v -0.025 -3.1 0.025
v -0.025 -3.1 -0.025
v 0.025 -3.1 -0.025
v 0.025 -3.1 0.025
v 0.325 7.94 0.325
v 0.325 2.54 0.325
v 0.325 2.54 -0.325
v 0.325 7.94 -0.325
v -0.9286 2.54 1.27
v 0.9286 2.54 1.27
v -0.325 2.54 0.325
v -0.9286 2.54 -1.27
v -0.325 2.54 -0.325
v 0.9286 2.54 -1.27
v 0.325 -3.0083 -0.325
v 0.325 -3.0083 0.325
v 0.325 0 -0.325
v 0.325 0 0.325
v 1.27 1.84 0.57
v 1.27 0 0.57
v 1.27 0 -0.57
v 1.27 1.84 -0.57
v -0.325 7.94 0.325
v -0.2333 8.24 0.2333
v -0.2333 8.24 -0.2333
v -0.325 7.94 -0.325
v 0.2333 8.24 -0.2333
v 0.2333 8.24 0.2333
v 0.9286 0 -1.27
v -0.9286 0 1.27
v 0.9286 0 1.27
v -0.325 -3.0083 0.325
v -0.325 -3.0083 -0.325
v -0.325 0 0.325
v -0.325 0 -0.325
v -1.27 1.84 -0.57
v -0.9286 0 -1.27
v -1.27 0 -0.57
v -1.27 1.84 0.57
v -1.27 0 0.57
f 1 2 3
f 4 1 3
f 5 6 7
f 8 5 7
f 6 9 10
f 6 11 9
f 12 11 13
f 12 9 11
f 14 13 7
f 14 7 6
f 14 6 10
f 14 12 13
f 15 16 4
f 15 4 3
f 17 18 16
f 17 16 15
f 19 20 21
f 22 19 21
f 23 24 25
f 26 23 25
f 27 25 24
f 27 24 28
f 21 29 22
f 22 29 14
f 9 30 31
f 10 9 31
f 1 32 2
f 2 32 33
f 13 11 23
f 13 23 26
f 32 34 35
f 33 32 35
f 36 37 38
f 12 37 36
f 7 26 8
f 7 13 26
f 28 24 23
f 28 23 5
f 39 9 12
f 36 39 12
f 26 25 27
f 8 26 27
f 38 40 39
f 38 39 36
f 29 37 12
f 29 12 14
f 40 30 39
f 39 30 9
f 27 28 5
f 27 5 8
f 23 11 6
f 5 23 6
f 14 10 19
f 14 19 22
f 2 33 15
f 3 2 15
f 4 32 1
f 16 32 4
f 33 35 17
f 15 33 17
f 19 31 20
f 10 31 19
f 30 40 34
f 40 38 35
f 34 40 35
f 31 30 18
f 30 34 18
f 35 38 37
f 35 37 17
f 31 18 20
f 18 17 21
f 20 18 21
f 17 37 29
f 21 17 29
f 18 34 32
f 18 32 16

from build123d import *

# Parameters (mm, degrees)
SKETCH1_W                = 2.54
SKETCH1_H                = 2.54
BOSS_EXTRUDE1_DEPTH      = 2.54
SKETCH2_W                = 0.65
SKETCH2_H                = 0.65
BOSS_EXTRUDE2_DEPTH      = 5.7
BOSS_EXTRUDE2_DEPTH_BACK = 5.64
CHAMFER1_SIZE            = 0.3
CHAMFER1_SIZE2           = 0.091719204
CHAMFER1_PART_2_SIZE     = 0.3
CHAMFER1_PART_2_SIZE2    = 0.091719204
CHAMFER1_PART_3_SIZE     = 0.3
CHAMFER1_PART_3_SIZE2    = 0.091719204
CHAMFER1_PART_4_SIZE     = 0.3
CHAMFER1_PART_4_SIZE2    = 0.091719204
CHAMFER1_PART_5_SIZE     = 0.3
CHAMFER1_PART_5_SIZE2    = 0.091719204
CHAMFER3_SIZE            = 0.7
CHAMFER3_SIZE2           = 0.341412812
CHAMFER4_SIZE            = 0.7
CHAMFER4_SIZE2           = 0.341412812


with BuildPart() as part:
    # Sketch1 → Boss-Extrude1 (new body)
    with BuildSketch(Plane(origin=(0, 0, 0), x_dir=(1, 0, 0), z_dir=(0, 1, 0))):
        Rectangle(SKETCH1_W, SKETCH1_H)
    extrude(amount=BOSS_EXTRUDE1_DEPTH)

    # Sketch2 → Boss-Extrude2 (add, two sides)
    with BuildSketch(Plane(origin=(0, 2.54, 0), x_dir=(1, 0, 0), z_dir=(0, 1, 0))) as boss_extrude2_sk:
        Rectangle(SKETCH2_W, SKETCH2_H)
    extrude(amount=BOSS_EXTRUDE2_DEPTH)
    extrude(boss_extrude2_sk.sketch, amount=-BOSS_EXTRUDE2_DEPTH_BACK)

    # Chamfer1
    chamfer1_edges = [part.edges().sort_by_distance(p)[0] for p in [
        (-0.325, -3.1, 0),
        (0, -3.1, -0.325),
        (0.325, -3.1, 0),
        (0, -3.1, 0.325),
    ]]
    chamfer1_side = [part.faces().sort_by_distance(p)[0] for p in [
        (0, -3.1, 0),
    ]]
    chamfer(chamfer1_edges, length=CHAMFER1_SIZE, length2=CHAMFER1_SIZE2, reference=chamfer1_side[0])

    # Chamfer1 part 2
    chamfer1_part_2_edges = [part.edges().sort_by_distance(p)[0] for p in [
        (-0.325, 8.24, 0),
    ]]
    chamfer1_part_2_side = [part.faces().sort_by_distance(p)[0] for p in [
        (-0.325, 5.39, 0),
    ]]
    chamfer(chamfer1_part_2_edges, length=CHAMFER1_PART_2_SIZE, length2=CHAMFER1_PART_2_SIZE2, reference=chamfer1_part_2_side[0])

    # Chamfer1 part 3
    chamfer1_part_3_edges = [part.edges().sort_by_distance(p)[0] for p in [
        (0, 8.24, 0.325),
    ]]
    chamfer1_part_3_side = [part.faces().sort_by_distance(p)[0] for p in [
        (0, 5.39, 0.325),
    ]]
    chamfer(chamfer1_part_3_edges, length=CHAMFER1_PART_3_SIZE, length2=CHAMFER1_PART_3_SIZE2, reference=chamfer1_part_3_side[0])

    # Chamfer1 part 4
    chamfer1_part_4_edges = [part.edges().sort_by_distance(p)[0] for p in [
        (0.325, 8.24, 0),
    ]]
    chamfer1_part_4_side = [part.faces().sort_by_distance(p)[0] for p in [
        (0.325, 5.39, 0),
    ]]
    chamfer(chamfer1_part_4_edges, length=CHAMFER1_PART_4_SIZE, length2=CHAMFER1_PART_4_SIZE2, reference=chamfer1_part_4_side[0])

    # Chamfer1 part 5
    chamfer1_part_5_edges = [part.edges().sort_by_distance(p)[0] for p in [
        (0, 8.24, -0.325),
    ]]
    chamfer1_part_5_side = [part.faces().sort_by_distance(p)[0] for p in [
        (0, 5.39, -0.325),
    ]]
    chamfer(chamfer1_part_5_edges, length=CHAMFER1_PART_5_SIZE, length2=CHAMFER1_PART_5_SIZE2, reference=chamfer1_part_5_side[0])

    # Chamfer3
    chamfer3_edges = [part.edges().sort_by_distance(p)[0] for p in [
        (1.27, 2.54, 0),
        (1.27, 1.27, 1.27),
        (1.27, 1.27, -1.27),
    ]]
    chamfer3_side = [part.faces().sort_by_distance(p)[0] for p in [
        (1.27, 1.27, 0),
    ]]
    chamfer(chamfer3_edges, length=CHAMFER3_SIZE, length2=CHAMFER3_SIZE2, reference=chamfer3_side[0])

    # Chamfer4
    chamfer4_edges = [part.edges().sort_by_distance(p)[0] for p in [
        (-1.27, 2.54, 0),
        (-1.27, 1.27, 1.27),
        (-1.27, 1.27, -1.27),
    ]]
    chamfer4_side = [part.faces().sort_by_distance(p)[0] for p in [
        (-1.27, 1.27, 0),
    ]]
    chamfer(chamfer4_edges, length=CHAMFER4_SIZE, length2=CHAMFER4_SIZE2, reference=chamfer4_side[0])


solid = part.part
